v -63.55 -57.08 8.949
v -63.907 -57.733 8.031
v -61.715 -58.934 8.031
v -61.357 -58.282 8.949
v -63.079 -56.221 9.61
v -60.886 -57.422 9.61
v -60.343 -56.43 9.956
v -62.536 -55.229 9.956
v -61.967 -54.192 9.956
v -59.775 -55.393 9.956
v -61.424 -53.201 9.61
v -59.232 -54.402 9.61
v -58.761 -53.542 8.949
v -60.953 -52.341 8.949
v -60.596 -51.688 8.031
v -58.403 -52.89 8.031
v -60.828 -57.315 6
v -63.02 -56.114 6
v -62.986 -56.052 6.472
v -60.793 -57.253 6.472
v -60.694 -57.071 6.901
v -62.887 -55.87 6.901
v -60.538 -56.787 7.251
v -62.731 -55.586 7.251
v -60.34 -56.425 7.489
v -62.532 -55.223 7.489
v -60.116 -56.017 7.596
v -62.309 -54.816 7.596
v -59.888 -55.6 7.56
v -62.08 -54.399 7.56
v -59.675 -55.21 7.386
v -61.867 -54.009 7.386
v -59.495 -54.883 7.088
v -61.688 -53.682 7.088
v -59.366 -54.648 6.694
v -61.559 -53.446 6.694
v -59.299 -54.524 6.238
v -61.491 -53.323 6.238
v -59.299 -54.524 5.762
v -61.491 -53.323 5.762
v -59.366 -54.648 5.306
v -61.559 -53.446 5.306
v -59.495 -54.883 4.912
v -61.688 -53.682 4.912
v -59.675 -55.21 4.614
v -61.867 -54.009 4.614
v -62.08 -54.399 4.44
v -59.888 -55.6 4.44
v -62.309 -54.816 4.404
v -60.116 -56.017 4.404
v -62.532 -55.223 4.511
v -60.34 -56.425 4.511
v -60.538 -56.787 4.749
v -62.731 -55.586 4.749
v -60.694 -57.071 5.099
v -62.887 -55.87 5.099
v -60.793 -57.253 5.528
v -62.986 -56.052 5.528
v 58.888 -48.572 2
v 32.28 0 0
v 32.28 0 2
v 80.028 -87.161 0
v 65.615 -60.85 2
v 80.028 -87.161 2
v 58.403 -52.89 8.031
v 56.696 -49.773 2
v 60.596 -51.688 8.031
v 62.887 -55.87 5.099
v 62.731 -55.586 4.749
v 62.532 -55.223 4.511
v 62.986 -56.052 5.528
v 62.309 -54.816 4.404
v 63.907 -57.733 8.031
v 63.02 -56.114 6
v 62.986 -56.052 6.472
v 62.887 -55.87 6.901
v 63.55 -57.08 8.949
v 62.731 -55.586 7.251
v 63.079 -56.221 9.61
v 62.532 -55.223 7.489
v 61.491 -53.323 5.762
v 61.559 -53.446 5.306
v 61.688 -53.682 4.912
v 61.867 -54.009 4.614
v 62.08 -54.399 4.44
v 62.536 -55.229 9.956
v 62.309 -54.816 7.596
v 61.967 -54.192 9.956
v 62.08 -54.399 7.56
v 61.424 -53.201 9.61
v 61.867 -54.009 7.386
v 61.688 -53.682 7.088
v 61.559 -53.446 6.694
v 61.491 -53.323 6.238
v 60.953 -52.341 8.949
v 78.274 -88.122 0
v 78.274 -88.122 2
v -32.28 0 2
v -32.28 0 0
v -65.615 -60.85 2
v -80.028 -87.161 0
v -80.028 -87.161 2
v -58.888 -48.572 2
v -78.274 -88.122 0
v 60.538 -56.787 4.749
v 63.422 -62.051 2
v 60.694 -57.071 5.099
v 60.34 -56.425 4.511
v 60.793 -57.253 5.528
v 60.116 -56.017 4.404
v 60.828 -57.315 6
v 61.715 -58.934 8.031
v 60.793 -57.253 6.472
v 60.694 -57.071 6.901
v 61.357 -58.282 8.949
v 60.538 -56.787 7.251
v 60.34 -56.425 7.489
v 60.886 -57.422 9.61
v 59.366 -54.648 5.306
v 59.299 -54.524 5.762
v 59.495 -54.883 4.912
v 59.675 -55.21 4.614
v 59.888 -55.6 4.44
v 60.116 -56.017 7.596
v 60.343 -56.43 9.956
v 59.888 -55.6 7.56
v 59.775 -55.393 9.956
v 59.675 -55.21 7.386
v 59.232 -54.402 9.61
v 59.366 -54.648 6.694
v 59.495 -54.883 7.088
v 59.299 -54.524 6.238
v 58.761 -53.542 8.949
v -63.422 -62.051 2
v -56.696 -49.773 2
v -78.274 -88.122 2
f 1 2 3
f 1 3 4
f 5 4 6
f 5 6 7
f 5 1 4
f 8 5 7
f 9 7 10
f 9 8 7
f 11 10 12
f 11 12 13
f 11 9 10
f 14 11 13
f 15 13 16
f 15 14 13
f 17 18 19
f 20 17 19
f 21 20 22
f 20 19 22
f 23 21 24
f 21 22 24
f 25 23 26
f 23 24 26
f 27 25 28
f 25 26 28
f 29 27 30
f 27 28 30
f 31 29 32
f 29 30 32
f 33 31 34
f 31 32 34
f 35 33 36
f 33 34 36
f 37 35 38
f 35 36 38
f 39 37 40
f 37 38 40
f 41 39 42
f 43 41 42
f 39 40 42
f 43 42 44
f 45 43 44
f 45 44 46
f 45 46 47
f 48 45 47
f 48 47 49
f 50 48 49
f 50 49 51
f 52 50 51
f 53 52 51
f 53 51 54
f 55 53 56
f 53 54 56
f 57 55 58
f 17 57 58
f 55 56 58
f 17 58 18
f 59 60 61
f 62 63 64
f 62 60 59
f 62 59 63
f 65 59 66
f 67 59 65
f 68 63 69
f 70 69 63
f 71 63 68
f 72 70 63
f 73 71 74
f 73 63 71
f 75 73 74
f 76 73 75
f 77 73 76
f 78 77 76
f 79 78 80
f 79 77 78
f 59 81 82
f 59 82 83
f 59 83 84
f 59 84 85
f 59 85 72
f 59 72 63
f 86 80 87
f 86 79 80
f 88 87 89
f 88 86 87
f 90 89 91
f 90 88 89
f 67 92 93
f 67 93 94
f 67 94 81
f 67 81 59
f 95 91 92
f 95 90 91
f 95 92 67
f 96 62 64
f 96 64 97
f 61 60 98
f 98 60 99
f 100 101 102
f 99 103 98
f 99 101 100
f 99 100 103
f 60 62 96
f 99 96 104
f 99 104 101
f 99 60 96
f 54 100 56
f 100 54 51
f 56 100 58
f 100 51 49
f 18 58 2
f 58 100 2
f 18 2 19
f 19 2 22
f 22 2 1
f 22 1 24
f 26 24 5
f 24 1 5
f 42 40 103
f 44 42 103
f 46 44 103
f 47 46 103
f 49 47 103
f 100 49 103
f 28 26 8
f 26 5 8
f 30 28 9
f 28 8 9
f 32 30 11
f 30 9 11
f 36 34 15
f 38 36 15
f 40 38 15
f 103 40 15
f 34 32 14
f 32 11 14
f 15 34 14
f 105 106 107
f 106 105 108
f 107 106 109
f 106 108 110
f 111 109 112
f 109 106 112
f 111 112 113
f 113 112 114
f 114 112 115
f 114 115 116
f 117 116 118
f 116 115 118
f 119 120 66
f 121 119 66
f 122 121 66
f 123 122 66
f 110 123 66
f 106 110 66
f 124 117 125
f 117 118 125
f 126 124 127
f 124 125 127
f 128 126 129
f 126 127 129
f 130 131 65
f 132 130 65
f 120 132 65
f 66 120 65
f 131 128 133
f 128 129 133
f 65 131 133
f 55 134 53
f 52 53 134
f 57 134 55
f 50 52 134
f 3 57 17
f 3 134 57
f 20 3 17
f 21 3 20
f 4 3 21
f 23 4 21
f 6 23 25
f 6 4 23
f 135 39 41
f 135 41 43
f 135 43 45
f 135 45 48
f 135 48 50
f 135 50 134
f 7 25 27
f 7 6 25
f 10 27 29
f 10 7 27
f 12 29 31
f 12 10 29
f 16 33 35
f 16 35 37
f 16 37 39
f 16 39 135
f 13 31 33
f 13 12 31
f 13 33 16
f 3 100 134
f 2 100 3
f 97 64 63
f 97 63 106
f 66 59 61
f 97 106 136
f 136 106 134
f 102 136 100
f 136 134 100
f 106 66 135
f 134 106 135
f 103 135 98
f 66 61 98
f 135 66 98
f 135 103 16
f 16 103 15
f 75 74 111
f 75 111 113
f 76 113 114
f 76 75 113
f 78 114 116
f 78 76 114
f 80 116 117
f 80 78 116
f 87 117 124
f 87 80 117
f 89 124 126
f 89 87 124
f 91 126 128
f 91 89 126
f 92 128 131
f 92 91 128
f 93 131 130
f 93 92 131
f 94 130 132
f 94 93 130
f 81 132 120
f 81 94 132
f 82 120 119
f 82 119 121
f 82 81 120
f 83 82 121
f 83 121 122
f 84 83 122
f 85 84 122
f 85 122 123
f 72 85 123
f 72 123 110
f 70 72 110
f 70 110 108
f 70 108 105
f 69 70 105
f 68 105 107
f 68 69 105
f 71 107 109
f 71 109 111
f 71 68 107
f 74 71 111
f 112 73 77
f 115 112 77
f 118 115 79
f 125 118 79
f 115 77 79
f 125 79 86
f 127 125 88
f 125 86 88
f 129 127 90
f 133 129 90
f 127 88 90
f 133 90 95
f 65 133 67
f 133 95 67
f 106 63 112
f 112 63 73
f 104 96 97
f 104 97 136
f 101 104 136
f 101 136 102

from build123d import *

# Parameters (mm, degrees)
PAD_DEPTH    = 2
SKETCH001_R  = 1.6
PAD001_DEPTH = 2.5


with BuildPart() as part:
    # Sketch → Pad (new body)
    with BuildSketch(Plane.XY):
        Polygon((-30, 0), (30, 0), (32.280434, 0), (80.027856, -87.160748), (78.273803, -88.121634), (-78.273803, -88.121634), (-80.027856, -87.160748), (-32.280434, 0), align=None)
    extrude(amount=PAD_DEPTH)

    # Sketch001 (on Face1 of Pad) → Pad001 (join)
    with BuildSketch(Plane(origin=(-24.829299, 13.601708, 0), x_dir=(-0.480443, -0.877026, 0), z_dir=(-0.877026, 0.480443, 0))):
        with BuildLine():
            Line((84.891049, 2), (70.891049, 2))
            Line((70.891049, 2), (74.444895, 8.030769))
            ThreePointArc((81.337203, 8.030769), (77.891049, 10), (74.444895, 8.030769))
            Line((84.891049, 2), (81.337203, 8.030769))
        make_face()
        with Locations((77.891049, 6)):
            Circle(SKETCH001_R, mode=Mode.SUBTRACT)
    pad001 = extrude(amount=-PAD001_DEPTH)

    # Mirrored: Pad001 across YZ
    add(pad001.mirror(Plane.YZ))


solid = part.part
